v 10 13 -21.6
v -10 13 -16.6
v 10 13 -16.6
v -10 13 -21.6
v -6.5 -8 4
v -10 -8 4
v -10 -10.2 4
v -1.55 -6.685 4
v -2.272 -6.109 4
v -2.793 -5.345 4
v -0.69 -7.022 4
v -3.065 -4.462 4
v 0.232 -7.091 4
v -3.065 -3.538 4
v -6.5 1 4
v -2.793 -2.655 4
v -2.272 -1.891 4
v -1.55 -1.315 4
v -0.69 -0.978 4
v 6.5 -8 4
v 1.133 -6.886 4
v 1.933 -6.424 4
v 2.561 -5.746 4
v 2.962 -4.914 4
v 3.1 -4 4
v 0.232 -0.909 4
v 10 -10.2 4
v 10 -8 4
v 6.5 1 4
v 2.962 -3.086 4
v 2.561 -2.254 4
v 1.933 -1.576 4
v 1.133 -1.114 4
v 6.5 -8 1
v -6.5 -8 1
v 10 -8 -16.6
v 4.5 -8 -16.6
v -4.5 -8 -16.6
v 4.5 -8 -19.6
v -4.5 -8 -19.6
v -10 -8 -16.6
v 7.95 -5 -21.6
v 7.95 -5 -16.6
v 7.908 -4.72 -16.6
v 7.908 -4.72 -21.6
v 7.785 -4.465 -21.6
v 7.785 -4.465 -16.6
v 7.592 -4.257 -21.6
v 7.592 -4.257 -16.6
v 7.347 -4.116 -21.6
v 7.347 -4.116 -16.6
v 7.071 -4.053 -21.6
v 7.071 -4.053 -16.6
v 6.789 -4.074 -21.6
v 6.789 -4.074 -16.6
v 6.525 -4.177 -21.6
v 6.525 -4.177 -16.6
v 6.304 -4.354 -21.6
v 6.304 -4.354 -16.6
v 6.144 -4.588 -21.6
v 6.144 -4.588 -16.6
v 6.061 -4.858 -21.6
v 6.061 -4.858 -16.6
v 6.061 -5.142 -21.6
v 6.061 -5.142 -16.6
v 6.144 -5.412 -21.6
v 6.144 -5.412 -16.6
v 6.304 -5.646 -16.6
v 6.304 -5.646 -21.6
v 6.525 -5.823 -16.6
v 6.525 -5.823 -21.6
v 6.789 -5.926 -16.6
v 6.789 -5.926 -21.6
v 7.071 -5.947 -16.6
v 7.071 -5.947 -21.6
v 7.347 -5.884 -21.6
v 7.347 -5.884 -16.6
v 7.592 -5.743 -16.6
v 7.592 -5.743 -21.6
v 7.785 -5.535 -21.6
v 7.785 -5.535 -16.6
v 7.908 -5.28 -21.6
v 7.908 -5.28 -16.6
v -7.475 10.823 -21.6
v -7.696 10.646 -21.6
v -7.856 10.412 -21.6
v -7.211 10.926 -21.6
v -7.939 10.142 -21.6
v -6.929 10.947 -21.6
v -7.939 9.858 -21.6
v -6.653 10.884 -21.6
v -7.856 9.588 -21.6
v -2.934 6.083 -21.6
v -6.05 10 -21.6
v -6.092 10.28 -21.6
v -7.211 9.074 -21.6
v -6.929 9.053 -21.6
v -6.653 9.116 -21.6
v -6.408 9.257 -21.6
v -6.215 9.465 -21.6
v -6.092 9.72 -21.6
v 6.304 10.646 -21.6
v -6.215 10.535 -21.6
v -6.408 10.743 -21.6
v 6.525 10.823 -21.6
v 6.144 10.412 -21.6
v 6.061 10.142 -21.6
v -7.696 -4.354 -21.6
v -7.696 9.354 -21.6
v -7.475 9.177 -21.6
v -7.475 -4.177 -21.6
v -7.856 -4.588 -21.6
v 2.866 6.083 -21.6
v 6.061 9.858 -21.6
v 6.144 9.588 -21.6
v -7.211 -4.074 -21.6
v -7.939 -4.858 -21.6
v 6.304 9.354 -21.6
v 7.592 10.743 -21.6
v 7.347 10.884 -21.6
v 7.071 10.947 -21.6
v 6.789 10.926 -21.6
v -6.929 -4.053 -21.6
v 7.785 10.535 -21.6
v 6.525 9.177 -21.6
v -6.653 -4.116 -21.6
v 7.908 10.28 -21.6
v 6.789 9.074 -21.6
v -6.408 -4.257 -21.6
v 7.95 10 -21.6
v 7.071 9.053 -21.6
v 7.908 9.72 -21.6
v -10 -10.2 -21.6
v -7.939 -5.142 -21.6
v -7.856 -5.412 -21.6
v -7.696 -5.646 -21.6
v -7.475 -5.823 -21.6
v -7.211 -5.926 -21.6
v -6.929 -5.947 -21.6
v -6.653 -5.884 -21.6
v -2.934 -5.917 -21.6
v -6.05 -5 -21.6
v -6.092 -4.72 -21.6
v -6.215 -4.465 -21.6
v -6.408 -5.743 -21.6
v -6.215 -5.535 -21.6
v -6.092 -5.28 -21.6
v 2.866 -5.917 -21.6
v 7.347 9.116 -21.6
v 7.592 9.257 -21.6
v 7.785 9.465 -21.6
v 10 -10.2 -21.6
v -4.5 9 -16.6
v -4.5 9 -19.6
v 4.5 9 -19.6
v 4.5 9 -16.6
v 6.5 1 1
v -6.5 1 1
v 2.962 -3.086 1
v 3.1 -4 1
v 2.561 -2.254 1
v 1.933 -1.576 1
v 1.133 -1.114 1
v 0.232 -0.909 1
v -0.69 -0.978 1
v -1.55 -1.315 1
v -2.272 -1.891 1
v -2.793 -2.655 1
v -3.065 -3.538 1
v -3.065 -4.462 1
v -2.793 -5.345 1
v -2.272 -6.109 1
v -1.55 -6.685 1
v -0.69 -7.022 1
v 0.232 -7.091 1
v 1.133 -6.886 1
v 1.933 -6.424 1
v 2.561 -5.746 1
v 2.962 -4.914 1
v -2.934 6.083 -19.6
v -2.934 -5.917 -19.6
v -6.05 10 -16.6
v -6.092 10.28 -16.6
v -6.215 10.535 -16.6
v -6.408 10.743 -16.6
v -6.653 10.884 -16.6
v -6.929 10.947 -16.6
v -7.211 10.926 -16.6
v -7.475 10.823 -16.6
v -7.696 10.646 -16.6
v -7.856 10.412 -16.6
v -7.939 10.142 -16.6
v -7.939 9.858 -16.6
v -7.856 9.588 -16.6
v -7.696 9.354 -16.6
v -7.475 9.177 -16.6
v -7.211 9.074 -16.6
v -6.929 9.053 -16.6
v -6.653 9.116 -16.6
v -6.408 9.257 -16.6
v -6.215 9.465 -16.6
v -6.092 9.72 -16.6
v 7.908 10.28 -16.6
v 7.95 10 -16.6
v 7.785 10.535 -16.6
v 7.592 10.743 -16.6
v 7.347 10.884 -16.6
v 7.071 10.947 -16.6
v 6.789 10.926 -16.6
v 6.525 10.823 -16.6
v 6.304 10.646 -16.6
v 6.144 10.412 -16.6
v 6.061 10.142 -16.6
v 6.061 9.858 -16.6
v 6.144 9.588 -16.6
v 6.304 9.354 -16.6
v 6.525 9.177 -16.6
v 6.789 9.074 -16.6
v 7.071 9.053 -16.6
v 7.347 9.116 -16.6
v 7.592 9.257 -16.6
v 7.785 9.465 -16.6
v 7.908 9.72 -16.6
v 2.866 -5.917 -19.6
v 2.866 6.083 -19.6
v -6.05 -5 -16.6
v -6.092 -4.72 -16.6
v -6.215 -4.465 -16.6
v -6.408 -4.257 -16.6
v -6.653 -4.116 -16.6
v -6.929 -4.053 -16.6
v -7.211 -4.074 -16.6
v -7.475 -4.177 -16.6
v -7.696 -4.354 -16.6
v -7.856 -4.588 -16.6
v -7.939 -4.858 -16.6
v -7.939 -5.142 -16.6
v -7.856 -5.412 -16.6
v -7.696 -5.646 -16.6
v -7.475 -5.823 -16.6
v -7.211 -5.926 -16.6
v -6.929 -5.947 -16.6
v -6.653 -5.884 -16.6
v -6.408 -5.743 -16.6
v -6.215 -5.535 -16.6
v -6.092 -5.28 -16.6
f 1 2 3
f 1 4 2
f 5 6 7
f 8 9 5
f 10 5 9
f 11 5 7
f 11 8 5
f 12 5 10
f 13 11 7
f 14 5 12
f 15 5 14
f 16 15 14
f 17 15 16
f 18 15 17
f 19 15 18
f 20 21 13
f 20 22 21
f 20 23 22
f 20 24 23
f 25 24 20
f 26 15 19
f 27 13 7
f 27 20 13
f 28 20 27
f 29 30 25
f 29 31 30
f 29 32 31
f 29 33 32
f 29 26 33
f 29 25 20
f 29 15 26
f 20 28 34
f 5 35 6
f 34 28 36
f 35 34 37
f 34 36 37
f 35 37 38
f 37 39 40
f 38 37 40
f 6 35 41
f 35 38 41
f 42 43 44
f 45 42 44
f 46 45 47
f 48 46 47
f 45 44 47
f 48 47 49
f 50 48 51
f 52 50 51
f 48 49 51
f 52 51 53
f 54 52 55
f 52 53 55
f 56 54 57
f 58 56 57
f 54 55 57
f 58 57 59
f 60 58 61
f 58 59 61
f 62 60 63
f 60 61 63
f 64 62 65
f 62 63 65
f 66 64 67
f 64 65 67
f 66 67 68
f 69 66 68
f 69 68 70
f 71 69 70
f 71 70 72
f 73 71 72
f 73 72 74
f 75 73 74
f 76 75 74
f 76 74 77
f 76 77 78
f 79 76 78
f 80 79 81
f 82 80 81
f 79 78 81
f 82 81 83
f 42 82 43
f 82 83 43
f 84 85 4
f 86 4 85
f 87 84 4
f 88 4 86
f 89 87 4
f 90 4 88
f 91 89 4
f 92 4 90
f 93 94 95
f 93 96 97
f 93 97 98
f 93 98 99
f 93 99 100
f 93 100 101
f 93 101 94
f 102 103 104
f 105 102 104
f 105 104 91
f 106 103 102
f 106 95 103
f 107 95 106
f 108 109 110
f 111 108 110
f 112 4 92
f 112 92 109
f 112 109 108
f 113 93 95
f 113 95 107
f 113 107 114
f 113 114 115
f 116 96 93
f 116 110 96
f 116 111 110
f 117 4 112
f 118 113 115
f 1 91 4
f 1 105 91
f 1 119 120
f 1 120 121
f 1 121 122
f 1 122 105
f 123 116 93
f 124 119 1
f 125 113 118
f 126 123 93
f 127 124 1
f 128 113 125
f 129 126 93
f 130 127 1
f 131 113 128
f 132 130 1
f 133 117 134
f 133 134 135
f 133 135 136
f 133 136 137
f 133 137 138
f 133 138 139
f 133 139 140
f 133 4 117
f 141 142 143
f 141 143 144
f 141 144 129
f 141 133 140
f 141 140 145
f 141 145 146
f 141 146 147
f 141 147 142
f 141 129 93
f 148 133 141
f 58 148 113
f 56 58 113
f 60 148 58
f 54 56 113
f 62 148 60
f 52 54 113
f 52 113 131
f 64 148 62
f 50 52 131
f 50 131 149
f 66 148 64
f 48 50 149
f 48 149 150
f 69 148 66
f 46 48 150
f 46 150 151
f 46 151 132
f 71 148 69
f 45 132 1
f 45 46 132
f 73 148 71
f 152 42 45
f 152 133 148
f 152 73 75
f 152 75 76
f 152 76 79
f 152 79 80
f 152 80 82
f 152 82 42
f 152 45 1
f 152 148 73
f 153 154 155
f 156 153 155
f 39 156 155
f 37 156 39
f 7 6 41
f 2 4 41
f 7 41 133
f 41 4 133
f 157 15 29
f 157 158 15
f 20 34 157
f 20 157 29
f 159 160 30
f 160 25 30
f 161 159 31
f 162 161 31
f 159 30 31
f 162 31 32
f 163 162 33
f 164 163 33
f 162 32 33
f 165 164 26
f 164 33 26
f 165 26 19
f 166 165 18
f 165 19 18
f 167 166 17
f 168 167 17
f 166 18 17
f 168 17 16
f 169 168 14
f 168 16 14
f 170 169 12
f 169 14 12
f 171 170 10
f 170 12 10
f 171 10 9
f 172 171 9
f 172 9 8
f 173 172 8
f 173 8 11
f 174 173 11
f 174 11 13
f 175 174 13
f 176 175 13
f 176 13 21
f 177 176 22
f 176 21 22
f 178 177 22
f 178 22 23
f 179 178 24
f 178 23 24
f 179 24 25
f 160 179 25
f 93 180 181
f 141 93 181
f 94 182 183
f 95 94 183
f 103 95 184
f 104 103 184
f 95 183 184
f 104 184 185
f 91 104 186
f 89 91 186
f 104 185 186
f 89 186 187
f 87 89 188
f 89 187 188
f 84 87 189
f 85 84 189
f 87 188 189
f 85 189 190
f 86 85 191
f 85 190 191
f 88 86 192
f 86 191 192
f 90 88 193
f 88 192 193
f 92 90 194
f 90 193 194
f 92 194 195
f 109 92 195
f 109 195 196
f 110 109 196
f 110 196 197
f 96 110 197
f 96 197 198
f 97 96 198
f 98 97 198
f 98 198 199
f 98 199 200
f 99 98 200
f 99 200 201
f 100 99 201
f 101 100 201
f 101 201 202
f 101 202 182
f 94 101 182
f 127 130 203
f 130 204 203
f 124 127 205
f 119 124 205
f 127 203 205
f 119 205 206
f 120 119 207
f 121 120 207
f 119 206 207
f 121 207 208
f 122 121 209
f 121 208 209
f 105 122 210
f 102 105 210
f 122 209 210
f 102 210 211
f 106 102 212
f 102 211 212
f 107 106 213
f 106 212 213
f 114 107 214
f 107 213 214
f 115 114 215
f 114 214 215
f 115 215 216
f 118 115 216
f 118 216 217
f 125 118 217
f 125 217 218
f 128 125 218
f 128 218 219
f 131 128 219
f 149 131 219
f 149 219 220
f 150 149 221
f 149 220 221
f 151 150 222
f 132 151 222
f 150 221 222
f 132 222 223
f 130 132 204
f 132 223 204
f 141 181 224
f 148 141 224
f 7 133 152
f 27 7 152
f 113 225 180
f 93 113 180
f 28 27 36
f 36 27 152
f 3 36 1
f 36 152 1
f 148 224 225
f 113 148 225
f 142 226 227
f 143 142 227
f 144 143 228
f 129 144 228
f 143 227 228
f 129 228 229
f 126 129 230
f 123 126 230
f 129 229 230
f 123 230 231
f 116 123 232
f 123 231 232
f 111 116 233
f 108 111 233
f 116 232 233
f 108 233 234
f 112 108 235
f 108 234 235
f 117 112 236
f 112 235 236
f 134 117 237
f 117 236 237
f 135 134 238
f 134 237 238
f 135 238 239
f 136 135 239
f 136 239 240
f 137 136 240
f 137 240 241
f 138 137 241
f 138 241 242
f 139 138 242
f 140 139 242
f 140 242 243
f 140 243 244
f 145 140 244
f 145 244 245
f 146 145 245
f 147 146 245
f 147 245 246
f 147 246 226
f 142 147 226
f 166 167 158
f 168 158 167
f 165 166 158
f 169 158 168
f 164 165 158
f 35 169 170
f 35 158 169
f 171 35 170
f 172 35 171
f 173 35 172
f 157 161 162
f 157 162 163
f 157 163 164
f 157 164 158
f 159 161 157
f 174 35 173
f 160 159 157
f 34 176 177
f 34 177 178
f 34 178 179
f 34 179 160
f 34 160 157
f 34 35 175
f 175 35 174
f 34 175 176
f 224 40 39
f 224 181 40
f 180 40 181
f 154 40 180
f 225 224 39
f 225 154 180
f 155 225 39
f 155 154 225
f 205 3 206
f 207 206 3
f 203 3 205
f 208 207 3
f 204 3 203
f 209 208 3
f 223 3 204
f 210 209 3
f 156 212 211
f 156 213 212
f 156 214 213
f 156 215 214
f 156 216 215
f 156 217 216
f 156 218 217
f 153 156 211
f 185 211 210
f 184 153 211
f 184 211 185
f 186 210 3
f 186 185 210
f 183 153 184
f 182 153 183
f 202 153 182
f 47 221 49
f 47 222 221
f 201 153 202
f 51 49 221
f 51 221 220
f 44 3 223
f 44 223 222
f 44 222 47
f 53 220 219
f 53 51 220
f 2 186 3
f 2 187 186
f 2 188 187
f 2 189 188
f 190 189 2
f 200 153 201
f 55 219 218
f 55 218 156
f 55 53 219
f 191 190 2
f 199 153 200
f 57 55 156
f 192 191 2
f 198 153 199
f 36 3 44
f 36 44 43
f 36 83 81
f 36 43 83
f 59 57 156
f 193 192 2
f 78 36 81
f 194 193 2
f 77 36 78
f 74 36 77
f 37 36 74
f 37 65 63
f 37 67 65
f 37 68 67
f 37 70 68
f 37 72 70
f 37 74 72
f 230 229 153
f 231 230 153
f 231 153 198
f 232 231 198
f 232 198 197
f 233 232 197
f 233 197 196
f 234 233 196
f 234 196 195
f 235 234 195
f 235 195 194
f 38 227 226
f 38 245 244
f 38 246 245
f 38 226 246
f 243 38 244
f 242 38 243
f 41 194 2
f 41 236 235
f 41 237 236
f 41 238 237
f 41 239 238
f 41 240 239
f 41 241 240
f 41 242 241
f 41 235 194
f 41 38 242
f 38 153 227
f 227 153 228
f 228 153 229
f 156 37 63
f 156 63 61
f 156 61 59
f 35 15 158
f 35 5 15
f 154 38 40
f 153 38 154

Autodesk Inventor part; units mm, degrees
ref_plane "YZ Plane" through (0, 0, 0) normal (1, 0, 0) x (0, 1, 0)
ref_plane "XZ Plane" through (0, 0, 0) normal (0, 1, 0) x (-1, 0, 0)
sketch "Náčrt1" plane through (0, 0, 0) normal (0, 0, 1) x (1, 0, 0)
  line L0 (0, 12.6) -> (0, -12.6) projected
  line L1 (-12.6, 0) -> (12.6, 0) projected
  line L2 (-9, 9) -> (9, 9)
  line L3 (9, 9) -> (9, -9)
  line L4 (9, -9) -> (-9, -9)
  line L5 (-9, -9) -> (-9, 9)
  point P0 (0, 0)
  dimension "d0" = 18
  dimension "d1" = 18
extrude "Vysunutí1" add sketch "Náčrt1" against normal blind 20
sketch "Náčrt2" plane through (-9, 9, 0) normal (0, 1, 0) x (1, 0, 0)
  line L0 (18, 0) -> (0, 0) projected
  line L1 (18, 0) -> (18, 20) projected
  line L2 (0, 20) -> (18, 20) projected
  line L3 (0, 0) -> (0, 20) projected
  line L4 (1.3, 16.6) -> (1.3, 3)
  line L5 (1.3, 3) -> (16.7, 3)
  line L6 (16.7, 3) -> (16.7, 16.6)
  line L7 (16.7, 16.6) -> (1.3, 16.6)
  point P0 (9, 0)
  dimension "d4" = 3.4
  dimension "d5" = 3
  dimension "d6" = 1.3
  dimension "d7" = 1.3
sketch "Náčrt3" plane through (0, 0, 0) normal (0, 0, 1) x (1, 0, 0)
  point P0 (0, 0)
extrude "Vysunutí2" cut sketch "Náčrt2" against normal blind 17 contours L7 L6 L5 L4
sketch "Náčrt4" plane through (0, 0, 0) normal (0, 0, 1) x (1, 0, 0)
  line L0 (0, 12.6) -> (0, -12.6) projected
  line L1 (-12.6, 0) -> (12.6, 0) projected
  circle A0 centre (0, -4) radius 3.1
  line L2 (-9, -9) -> (9, -9) projected
  point P0 (0, 0)
  dimension "d10" = 6.2
  dimension "d11" = 5
extrude "Vysunutí3" cut sketch "Náčrt4" against normal blind 3
sketch "Náčrt5" plane through (-9, 9, 0) normal (0, 1, 0) x (1, 0, 0)
  line L0 (1.3, 3) -> (1.3, 16.6) projected
  line L1 (1.3, 16.6) -> (16.7, 16.6) projected
  line L2 (16.7, 3) -> (1.3, 3) projected
  line L3 (16.7, 16.6) -> (16.7, 3) projected
  line L4 (1.3, 16.6) -> (16.7, 16.6) projected
  line L5 (1.3, 3) -> (1.3, 16.6) projected
  line L6 (16.7, 16.6) -> (16.7, 3) projected
  line L7 (16.7, 16.6) -> (16.7, 3) projected
  line L8 (16.7, 3) -> (1.3, 3) projected
  line L9 (1.3, 3) -> (1.3, 16.6) projected
  line L10 (1.3, 16.6) -> (16.7, 16.6) projected
  line L11 (18, 0) -> (0, 0) projected
  line L12 (18, 0) -> (18, 20) projected
  line L13 (0, 20) -> (18, 20) projected
  line L14 (0, 0) -> (0, 20) projected
  line L15 (1.3, 16.6) -> (0, 16.6)
  line L16 (0, 0) -> (0, 20) projected
  line L17 (0, 16.6) -> (0, 0)
  line L18 (0, 0) -> (18, 0)
  line L19 (18, 0) -> (18, 16.6)
  line L20 (18, 0) -> (18, 20) projected
  line L21 (16.7, 16.6) -> (18, 16.6)
  line L22 (16.7, 16.6) -> (16.7, 3)
  line L23 (16.7, 3) -> (1.3, 3) projected
  line L24 (16.7, 3) -> (1.3, 3)
  line L25 (1.3, 3) -> (1.3, 16.6)
  line L26 (1.3, 3) -> (1.3, 16.6)
  point P0 (9, 0)
extrude "Vysunutí4" cut sketch "Náčrt5" against normal blind 8 contours L2 L3 L21 L12 L11 L14 L15 L0
sketch "Náčrt6" plane through (0, 0, -20) normal (0, 0, -1) x (-1, 0, 0)
  line L0 (-9, -9) -> (9, -9) projected
  line L1 (9, -9) -> (9, 9) projected
  line L2 (9, 9) -> (-9, 9) projected
  line L3 (-9, 9) -> (-9, -9) projected
  line L4 (0, -12.6) -> (0, 12.6) projected
  line L5 (-12.6, 0) -> (12.6, 0) projected
  line L6 (-2.8665, 6.0827) -> (2.9335, 6.0827)
  line L7 (2.9335, 6.0827) -> (2.9335, -5.9173)
  line L8 (2.9335, -5.9173) -> (-2.8665, -5.9173)
  line L9 (-2.8665, -5.9173) -> (-2.8665, 6.0827)
  point P0 (0, 0)
  dimension "d16" = 5.8
  dimension "d17" = 12
extrude "Vysunutí5" cut sketch "Náčrt6" against normal blind 8 contours L8 L9 L5 L4 | L4 L5 L7 L8 | L9 L6 L4 L5 | L4 L6 L7 L5
sketch "Náčrt13" plane through (9, -9, -20) normal (1, 0, 0) x (0, 0, -1)
  line L0 (-3.4, 10) -> (-20, 10) projected
  line L1 (-20, 0) -> (-20, 10) projected
  line L2 (-20, 0) -> (0, 0) projected
  line L3 (0, 18) -> (0, 0) projected
  line L4 (-3.4, 18) -> (0, 18) projected
  line L5 (-3.4, 18) -> (-3.4, 10) projected
  line L6 (-3.4, 1) -> (-17, 1) projected
  line L7 (-17, 1) -> (-3.4, 1) projected
  line L8 (-17, 10) -> (-3.4, 10) projected
  line L9 (-17, 1) -> (-17, 10)
  line L10 (-17, 8.1) -> (-17, 1.9) projected
  line L11 (-3.4, 1) -> (-3.4, 10)
  line L12 (-3.4, 1) -> (-17, 1)
  line L13 (-3.4, 10) -> (-17, 10)
  point P0 (-20, 9)
extrude "Vysunutí11" cut sketch "Náčrt13" against normal blind 20 contours L11 L6 L9 L0
sketch "Náčrt14" plane through (0, 0, 0) normal (0, 0, 1) x (1, 0, 0)
  line L0 (9, 1) -> (-9, 1) projected
  line L1 (-9, 1) -> (-9, -9) projected
  line L2 (-9, -9) -> (9, -9) projected
  line L3 (9, -9) -> (9, 1) projected
  circle A0 centre (0, -4) radius 3.1 projected
  line L4 (2.8665, -5.9173) -> (-2.9335, -5.9173) projected
  line L5 (9, -8) -> (-9, -8) projected
  line L6 (9, -8) -> (-9, -8) projected
  line L7 (9, 1) -> (6.5, 1)
  line L8 (6.5, 1) -> (6.5, -8)
  line L9 (6.5, -8) -> (9, -8)
  line L10 (9, -8) -> (9, 1)
  line L11 (-9, 1) -> (-6.5, 1)
  line L12 (-6.5, 1) -> (-6.5, -8)
  line L13 (-6.5, -8) -> (-9, -8)
  line L14 (-9, -8) -> (-9, 1)
  point P0 (0, 0)
  dimension "d44" = 2.5
  dimension "d45" = 2.5
extrude "Vysunutí12" cut sketch "Náčrt14" against normal blind 5 contours L3 L5 L8 L0 | L12 L5 L1 L0
sketch "Náčrt15" plane through (-9, -9, 0) normal (0, -1, 0) x (1, 0, 0)
  line L0 (0, 0) -> (18, 0) projected
  line L1 (0, 0) -> (0, -20) projected
  line L2 (18, -20) -> (0, -20) projected
  line L3 (18, 0) -> (18, -20) projected
  line L4 (18, 0) -> (0, 0)
  line L5 (0, 0) -> (0, -20)
  line L6 (0, -20) -> (18, -20)
  line L7 (18, -20) -> (18, 0)
  point P0 (9, 0)
extrude "Vysunutí13" add sketch "Náčrt15" along normal blind 1.2
sketch "Náčrt16" plane through (9, -8, -16.6) normal (1, 0, 0) x (0, 0, -1)
  line L0 (0, 0) -> (-16.6, 0) projected
  line L1 (-16.6, -2.2) -> (-16.6, 0) projected
  line L2 (3.4, -2.2) -> (-16.6, -2.2) projected
  line L3 (3.4, 17) -> (3.4, -2.2) projected
  line L4 (0, 17) -> (3.4, 17) projected
  line L5 (0, 17) -> (0, 0) projected
  line L6 (-16.6, 0) -> (3.4, 0)
  line L7 (3.4, 0) -> (3.4, -2.2)
  line L8 (3.4, -2.2) -> (-16.6, -2.2)
  line L9 (-16.6, -2.2) -> (-16.6, 0)
  line L10 (0, 17) -> (3.4, 17)
  line L11 (3.4, 17) -> (3.4, 0)
  line L12 (3.4, 0) -> (0, 0)
  line L13 (0, 0) -> (0, 17)
  point P0 (-16.6, 8)
extrude "Vysunutí14" add sketch "Náčrt16" along normal blind 3
sketch "Náčrt17" plane through (-9, -8, -16.6) normal (-1, 0, 0) x (0, 0, 1)
  line L0 (16.6, 0) -> (0, 0) projected
  line L1 (0, 0) -> (0, 17) projected
  line L2 (0, 17) -> (-3.4, 17) projected
  line L3 (-3.4, 17) -> (-3.4, -2.2) projected
  line L4 (16.6, -2.2) -> (-3.4, -2.2) projected
  line L5 (16.6, 0) -> (16.6, -2.2) projected
  line L6 (-3.4, 17) -> (0, 17)
  line L7 (0, 17) -> (0, -2.2)
  line L8 (0, -2.2) -> (-3.4, -2.2)
  line L9 (-3.4, -2.2) -> (-3.4, 17)
  line L10 (16.6, 0) -> (0, 0)
  line L11 (0, 0) -> (0, -2.2)
  line L12 (0, -2.2) -> (16.6, -2.2)
  line L13 (16.6, -2.2) -> (16.6, 0)
  point P0 (16.6, 8)
  point P1 (0, -1.1)
  dimension "d52" = 3.4
extrude "Vysunutí15" add sketch "Náčrt17" along normal blind 3
sketch "Náčrt18" plane through (0, 0, -20) normal (0, 0, -1) x (-1, 0, 0)
  line L0 (2.9335, 6.0827) -> (2.9335, -5.9173) projected
  line L1 (2.9335, -5.9173) -> (-2.8665, -5.9173) projected
  line L2 (-2.8665, -5.9173) -> (-2.8665, 6.0827) projected
  line L3 (-2.8665, 6.0827) -> (2.9335, 6.0827) projected
  line L4 (-12, 9) -> (12, 9) projected
  line L5 (-12, -10.2) -> (-12, 9) projected
  line L6 (-12, -10.2) -> (12, -10.2) projected
  line L7 (12, 9) -> (12, -10.2) projected
  line L8 (-12, 9) -> (12, 9)
  line L9 (12, 9) -> (12, -10.2)
  line L10 (12, -10.2) -> (-12, -10.2)
  line L11 (-12, -10.2) -> (-12, 9)
  line L12 (-2.8665, 6.0827) -> (2.9335, 6.0827)
  line L13 (2.9335, 6.0827) -> (2.9335, -5.9173)
  line L14 (2.9335, -5.9173) -> (-2.8665, -5.9173)
  line L15 (-2.8665, -5.9173) -> (-2.8665, 6.0827)
  point P0 (0, 0)
extrude "Vysunutí16" add sketch "Náčrt18" along normal blind 1.6
sketch "Náčrt19" plane through (12, -8, -16.6) normal (0, 0, 1) x (1, 0, 0)
  line L0 (-24, 17) -> (0, 17) projected
  line L1 (0, 0) -> (-24, 0) projected
  line L2 (-16.5, 17) -> (-7.5, 17)
  line L3 (-7.5, 17) -> (-7.5, 0)
  line L4 (-7.5, 0) -> (-16.5, 0)
  line L5 (-16.5, 0) -> (-16.5, 17)
  line L6 (-14.9335, 2.0827) -> (-14.9335, 14.0827) projected
  line L7 (-14.9335, 14.0827) -> (-9.1335, 14.0827) projected
  line L8 (-9.1335, 14.0827) -> (-9.1335, 2.0827) projected
  line L9 (-9.1335, 2.0827) -> (-14.9335, 2.0827) projected
  line L10 (0, 0) -> (-24, 0) projected
  line L11 (0, 17) -> (0, 0) projected
  line L12 (-24, 17) -> (0, 17) projected
  line L13 (-24, 0) -> (-24, 17) projected
  line L14 (-12, 17) -> (-12, 0)
  line L15 (-16.5, 17) -> (-7.5, 17)
  line L16 (-16.5, 0) -> (-7.5, 0)
  point P0 (-12, 8)
  point P1 (-16.5, 0)
  dimension "d57" = 9
ref_plane "Pracovní rovina1" through (12, -8, -9.8) normal (0, 0, 1) x (1, 0, 0)
extrude "Vysunutí17" cut sketch "Náčrt19" against normal blind 3 contours L0 L14 L7 L6 L9 L1 L5 | L0 L3 L1 L14 L9 L8 L7
sketch "Náčrt20" plane through (-12, 9, -21.6) normal (0, 1, 0) x (1, 0, 0)
  line L0 (0, -5) -> (0, 0) projected
  line L1 (24, -5) -> (24, 0) projected
  line L2 (0, 0) -> (24, 0)
  line L3 (24, 0) -> (24, -5)
  line L4 (24, -5) -> (0, -5)
  line L5 (0, -5) -> (0, 0)
  point P0 (12, -21.6)
extrude "Vysunutí18" add sketch "Náčrt20" along normal blind 4
sketch "Náčrt21" plane through (4.5, -8, -16.6) normal (0, 0, 1) x (1, 0, 0)
  line L0 (0, 17) -> (0, 0) projected
  line L1 (7.5, 0) -> (0, 0) projected
  line L2 (7.5, 0) -> (7.5, 21) projected
  line L3 (-16.5, 21) -> (7.5, 21) projected
  line L4 (-16.5, 0) -> (-16.5, 21) projected
  line L5 (-9, 0) -> (-16.5, 0) projected
  line L6 (-9, 0) -> (-9, 17) projected
  line L7 (-9, 17) -> (0, 17) projected
  circle A0 centre (-11.5, 18) radius 0.95
  circle A1 centre (2.5, 3) radius 0.95
  line L8 (7.5, 10.5) -> (-16.5, 10.5)
  circle A2 centre (2.5, 18) radius 0.95
  circle A3 centre (-11.5, 3) radius 0.95
  point P0 (-4.5, 8)
  dimension "d62" = 1.9
  dimension "d63" = 3
  dimension "d64" = 5
  dimension "d65" = 1.9
  dimension "d66" = 3
  dimension "d67" = 5
extrude "Vysunutí19" cut sketch "Náčrt21" against normal up to surface (5 mm away) contours A0 | A1 | A2 | A3
sketch "Náčrt22" plane through (-12, 13, -21.6) normal (0, 1, 0) x (1, 0, 0)
  line L0 (0, 0) -> (0, -5) projected
  line L1 (0, -5) -> (24, -5) projected
  line L2 (24, -5) -> (24, 0) projected
  line L3 (24, 0) -> (0, 0) projected
  line L4 (5.5, -21.6) -> (0, -21.6) projected
  line L5 (5.5, -21.6) -> (5.5, -18.6) projected
  line L6 (18.5, -18.6) -> (5.5, -18.6) projected
  line L7 (18.5, -21.6) -> (18.5, -18.6) projected
  line L8 (18.5, -21.6) -> (24, -21.6) projected
  line L9 (24, -5) -> (24, -21.6) projected
  line L10 (24, -5) -> (16.5, -5) projected
  line L11 (16.5, -5) -> (16.5, -2) projected
  line L12 (16.5, -2) -> (7.5, -2) projected
  line L13 (7.5, -5) -> (7.5, -2) projected
  line L14 (7.5, -5) -> (0, -5) projected
  line L15 (0, -21.6) -> (0, -5) projected
  line L16 (5.5, -18.6) -> (5.5, -21.6) projected
  line L17 (18.5, -21.6) -> (5.5, -21.6) projected
  line L18 (18.5, -21.6) -> (18.5, -18.6) projected
  line L19 (18.5, -18.6) -> (5.5, -18.6) projected
  line L20 (24, 0) -> (22, 0)
  line L21 (22, 0) -> (22, -21.6)
  line L22 (22, -21.6) -> (24, -21.6)
  line L23 (24, -21.6) -> (24, 0)
  line L24 (0, 0) -> (2, 0)
  line L25 (2, 0) -> (2, -21.6)
  line L26 (2, -21.6) -> (0, -21.6)
  line L27 (0, -21.6) -> (0, 0)
  point P0 (12, -21.6)
  dimension "d71" = 2
  dimension "d72" = 2
extrude "Vysunutí20" cut sketch "Náčrt22" against normal through all contours L3 L25 L1 L0 | L1 L25 L4 L15 | L3 L2 L1 L21 | L1 L9 L8 L21
sketch "Náčrt23" plane through (0, 0, 0) normal (0, 0, 1) x (1, 0, 0)
  line L0 (10, -10.2) -> (10, -8) projected
  line L1 (6.5, -8) -> (10, -8) projected
  line L2 (6.5, -8) -> (6.5, 1) projected
  line L3 (6.5, 1) -> (-6.5, 1) projected
  line L4 (-6.5, 1) -> (-6.5, -8) projected
  line L5 (-6.5, -8) -> (-10, -8) projected
  line L6 (-10, -8) -> (-10, -10.2) projected
  line L7 (-10, -10.2) -> (10, -10.2) projected
  circle A0 centre (0, -4) radius 3.1 projected
  line L8 (-10, -8) -> (10, -8)
  line L9 (10, -8) -> (10, -10.2)
  line L10 (10, -10.2) -> (-10, -10.2)
  line L11 (-10, -10.2) -> (-10, -8)
  point P0 (0, 0)
extrude "Vysunutí21" add sketch "Náčrt23" along normal blind 4 contours L7 L6 L5 L8 L1 L0
sketch "Náčrt24" plane through (-9, -8, 0) normal (0, 1, 0) x (1, 0, 0)
  line L0 (2.5, 3) -> (2.5, 0) projected
  line L1 (15.5, 0) -> (2.5, 0) projected
  line L2 (15.5, 0) -> (15.5, 3) projected
  line L3 (15.5, 3) -> (2.5, 3) projected
  line L4 (2.5, 0) -> (2.5, 3) projected
  line L5 (15.5, 3) -> (2.5, 3) projected
  line L6 (15.5, 0) -> (15.5, 3) projected
  line L7 (2.5, 0) -> (15.5, 0) projected
  line L8 (-1, 16.6) -> (-1, -4) projected
  line L9 (19, -4) -> (-1, -4) projected
  line L10 (19, -4) -> (19, 16.6) projected
  line L11 (19, 16.6) -> (13.5, 16.6) projected
  line L12 (13.5, 16.6) -> (13.5, 19.6) projected
  line L13 (13.5, 19.6) -> (4.5, 19.6) projected
  line L14 (4.5, 16.6) -> (4.5, 19.6) projected
  line L15 (4.5, 16.6) -> (-1, 16.6) projected
  line L16 (15.5, 3) -> (2.5, 3) projected
  line L17 (2.5, 3) -> (2.5, 0) projected
  line L18 (2.5, -1) -> (15.5, -1)
  line L19 (15.5, -1) -> (15.5, -4)
  line L20 (15.5, -4) -> (2.5, -4)
  line L21 (2.5, -4) -> (2.5, -1)
  line L22 (11.8665, 21.6) -> (6.0665, 21.6) projected
  point P0 (9, 0)
  point P1 (15.5, -2.5)
  point P2 (2.5, -4)
  dimension "d77" = 3
  dimension "d78" = 13
  dimension "d87" = 3.5
extrude "Vysunutí22" add sketch "Náčrt24" along normal up to surface (9 mm away) contours L21 L18 L19 L9
sketch "Náčrt25" plane through (0, 0, 4) normal (0, 0, 1) x (1, 0, 0)
  line L0 (10, -8) -> (6.5, -8) projected
  line L1 (6.5, -8) -> (6.5, 1) projected
  line L2 (-6.5, 1) -> (6.5, 1) projected
  line L3 (-6.5, -8) -> (-6.5, 1) projected
  line L4 (-6.5, -8) -> (-10, -8) projected
  line L5 (-10, -8) -> (-10, -10.2) projected
  line L6 (-10, -10.2) -> (10, -10.2) projected
  line L7 (10, -10.2) -> (10, -8) projected
  circle A0 centre (0, -4) radius 3.1 projected
  circle A1 centre (0, -4) radius 3.1
  point P0 (0, 0)
extrude "Vysunutí23" cut sketch "Náčrt25" against normal blind 10 contours A0
sketch "Náčrt26" plane through (-9, 1, 0) normal (0, 1, 0) x (1, 0, 0)
  line L0 (2.5, 3) -> (2.5, 0) projected
  line L1 (15.5, 0) -> (2.5, 0) projected
  line L2 (15.5, 0) -> (15.5, 3) projected
  line L3 (15.5, 3) -> (2.5, 3) projected
  line L4 (2.5, 3) -> (15.5, 3)
  line L5 (15.5, 3) -> (15.5, 0)
  line L6 (15.5, 0) -> (2.5, 0)
  line L7 (2.5, 0) -> (2.5, 3)
  line L8 (2.5, 3) -> (15.5, 3)
  line L9 (15.5, 3) -> (15.5, 0)
  line L10 (15.5, 0) -> (2.5, 0)
  line L11 (2.5, 0) -> (2.5, 3)
  point P0 (9, 0)
extrude "Vysunutí24" cut sketch "Náčrt26" against normal up to surface (9 mm away)
properties part number "laser_krabicka2_3D tisk"
